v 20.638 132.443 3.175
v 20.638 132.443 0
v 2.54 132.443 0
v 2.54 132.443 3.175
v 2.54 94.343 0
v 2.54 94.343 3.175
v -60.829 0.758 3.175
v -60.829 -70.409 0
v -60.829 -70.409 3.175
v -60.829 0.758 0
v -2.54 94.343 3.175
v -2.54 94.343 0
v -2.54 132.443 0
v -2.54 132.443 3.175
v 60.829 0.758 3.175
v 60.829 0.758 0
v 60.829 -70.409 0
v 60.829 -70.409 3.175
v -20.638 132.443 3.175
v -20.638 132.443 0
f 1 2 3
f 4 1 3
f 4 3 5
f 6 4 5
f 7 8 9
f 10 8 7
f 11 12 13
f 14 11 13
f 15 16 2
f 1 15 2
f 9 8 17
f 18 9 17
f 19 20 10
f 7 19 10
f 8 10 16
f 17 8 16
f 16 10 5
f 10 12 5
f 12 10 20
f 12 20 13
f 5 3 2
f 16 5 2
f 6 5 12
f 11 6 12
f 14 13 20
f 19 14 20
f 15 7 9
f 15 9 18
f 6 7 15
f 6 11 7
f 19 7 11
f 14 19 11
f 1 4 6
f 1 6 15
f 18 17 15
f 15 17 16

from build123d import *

# Parameters (mm, degrees)
F0_W     = 60.8292
F0_H     = 71.166755
F1_DEPTH = 3.175
F0_W_2   = 2.54
F0_H_2   = 38.1
F2_DEPTH = 3.175


with BuildPart() as f1:
    # F0 (on Top) → F1 (new body)
    with BuildSketch(Plane.XY):
        Polygon((0, 94.343368), (0, 0.757935), (60.8292, 0.757935), (20.6375, 132.443368), (2.54, 132.443368), (2.54, 94.343368), align=None)
        Polygon((-2.54, 132.443368), (-20.6375, 132.443368), (-60.8292, 0.757935), (0, 0.757935), (0, 94.343368), (-2.54, 94.343368), align=None)
        with Locations((-30.4146, -34.825442)):
            Rectangle(F0_W, F0_H)
        with Locations((30.4146, -34.825442)):
            Rectangle(F0_W, F0_H)
    extrude(amount=F1_DEPTH)

    # F0 (on Top) → F2 (cut)
    with BuildSketch(Plane.XY):
        with Locations((-1.27, 113.393368)):
            Rectangle(F0_W_2, F0_H_2)
        with Locations((1.27, 113.393368)):
            Rectangle(F0_W_2, F0_H_2)
    extrude(amount=-F2_DEPTH, mode=Mode.SUBTRACT)


solid = f1.part
